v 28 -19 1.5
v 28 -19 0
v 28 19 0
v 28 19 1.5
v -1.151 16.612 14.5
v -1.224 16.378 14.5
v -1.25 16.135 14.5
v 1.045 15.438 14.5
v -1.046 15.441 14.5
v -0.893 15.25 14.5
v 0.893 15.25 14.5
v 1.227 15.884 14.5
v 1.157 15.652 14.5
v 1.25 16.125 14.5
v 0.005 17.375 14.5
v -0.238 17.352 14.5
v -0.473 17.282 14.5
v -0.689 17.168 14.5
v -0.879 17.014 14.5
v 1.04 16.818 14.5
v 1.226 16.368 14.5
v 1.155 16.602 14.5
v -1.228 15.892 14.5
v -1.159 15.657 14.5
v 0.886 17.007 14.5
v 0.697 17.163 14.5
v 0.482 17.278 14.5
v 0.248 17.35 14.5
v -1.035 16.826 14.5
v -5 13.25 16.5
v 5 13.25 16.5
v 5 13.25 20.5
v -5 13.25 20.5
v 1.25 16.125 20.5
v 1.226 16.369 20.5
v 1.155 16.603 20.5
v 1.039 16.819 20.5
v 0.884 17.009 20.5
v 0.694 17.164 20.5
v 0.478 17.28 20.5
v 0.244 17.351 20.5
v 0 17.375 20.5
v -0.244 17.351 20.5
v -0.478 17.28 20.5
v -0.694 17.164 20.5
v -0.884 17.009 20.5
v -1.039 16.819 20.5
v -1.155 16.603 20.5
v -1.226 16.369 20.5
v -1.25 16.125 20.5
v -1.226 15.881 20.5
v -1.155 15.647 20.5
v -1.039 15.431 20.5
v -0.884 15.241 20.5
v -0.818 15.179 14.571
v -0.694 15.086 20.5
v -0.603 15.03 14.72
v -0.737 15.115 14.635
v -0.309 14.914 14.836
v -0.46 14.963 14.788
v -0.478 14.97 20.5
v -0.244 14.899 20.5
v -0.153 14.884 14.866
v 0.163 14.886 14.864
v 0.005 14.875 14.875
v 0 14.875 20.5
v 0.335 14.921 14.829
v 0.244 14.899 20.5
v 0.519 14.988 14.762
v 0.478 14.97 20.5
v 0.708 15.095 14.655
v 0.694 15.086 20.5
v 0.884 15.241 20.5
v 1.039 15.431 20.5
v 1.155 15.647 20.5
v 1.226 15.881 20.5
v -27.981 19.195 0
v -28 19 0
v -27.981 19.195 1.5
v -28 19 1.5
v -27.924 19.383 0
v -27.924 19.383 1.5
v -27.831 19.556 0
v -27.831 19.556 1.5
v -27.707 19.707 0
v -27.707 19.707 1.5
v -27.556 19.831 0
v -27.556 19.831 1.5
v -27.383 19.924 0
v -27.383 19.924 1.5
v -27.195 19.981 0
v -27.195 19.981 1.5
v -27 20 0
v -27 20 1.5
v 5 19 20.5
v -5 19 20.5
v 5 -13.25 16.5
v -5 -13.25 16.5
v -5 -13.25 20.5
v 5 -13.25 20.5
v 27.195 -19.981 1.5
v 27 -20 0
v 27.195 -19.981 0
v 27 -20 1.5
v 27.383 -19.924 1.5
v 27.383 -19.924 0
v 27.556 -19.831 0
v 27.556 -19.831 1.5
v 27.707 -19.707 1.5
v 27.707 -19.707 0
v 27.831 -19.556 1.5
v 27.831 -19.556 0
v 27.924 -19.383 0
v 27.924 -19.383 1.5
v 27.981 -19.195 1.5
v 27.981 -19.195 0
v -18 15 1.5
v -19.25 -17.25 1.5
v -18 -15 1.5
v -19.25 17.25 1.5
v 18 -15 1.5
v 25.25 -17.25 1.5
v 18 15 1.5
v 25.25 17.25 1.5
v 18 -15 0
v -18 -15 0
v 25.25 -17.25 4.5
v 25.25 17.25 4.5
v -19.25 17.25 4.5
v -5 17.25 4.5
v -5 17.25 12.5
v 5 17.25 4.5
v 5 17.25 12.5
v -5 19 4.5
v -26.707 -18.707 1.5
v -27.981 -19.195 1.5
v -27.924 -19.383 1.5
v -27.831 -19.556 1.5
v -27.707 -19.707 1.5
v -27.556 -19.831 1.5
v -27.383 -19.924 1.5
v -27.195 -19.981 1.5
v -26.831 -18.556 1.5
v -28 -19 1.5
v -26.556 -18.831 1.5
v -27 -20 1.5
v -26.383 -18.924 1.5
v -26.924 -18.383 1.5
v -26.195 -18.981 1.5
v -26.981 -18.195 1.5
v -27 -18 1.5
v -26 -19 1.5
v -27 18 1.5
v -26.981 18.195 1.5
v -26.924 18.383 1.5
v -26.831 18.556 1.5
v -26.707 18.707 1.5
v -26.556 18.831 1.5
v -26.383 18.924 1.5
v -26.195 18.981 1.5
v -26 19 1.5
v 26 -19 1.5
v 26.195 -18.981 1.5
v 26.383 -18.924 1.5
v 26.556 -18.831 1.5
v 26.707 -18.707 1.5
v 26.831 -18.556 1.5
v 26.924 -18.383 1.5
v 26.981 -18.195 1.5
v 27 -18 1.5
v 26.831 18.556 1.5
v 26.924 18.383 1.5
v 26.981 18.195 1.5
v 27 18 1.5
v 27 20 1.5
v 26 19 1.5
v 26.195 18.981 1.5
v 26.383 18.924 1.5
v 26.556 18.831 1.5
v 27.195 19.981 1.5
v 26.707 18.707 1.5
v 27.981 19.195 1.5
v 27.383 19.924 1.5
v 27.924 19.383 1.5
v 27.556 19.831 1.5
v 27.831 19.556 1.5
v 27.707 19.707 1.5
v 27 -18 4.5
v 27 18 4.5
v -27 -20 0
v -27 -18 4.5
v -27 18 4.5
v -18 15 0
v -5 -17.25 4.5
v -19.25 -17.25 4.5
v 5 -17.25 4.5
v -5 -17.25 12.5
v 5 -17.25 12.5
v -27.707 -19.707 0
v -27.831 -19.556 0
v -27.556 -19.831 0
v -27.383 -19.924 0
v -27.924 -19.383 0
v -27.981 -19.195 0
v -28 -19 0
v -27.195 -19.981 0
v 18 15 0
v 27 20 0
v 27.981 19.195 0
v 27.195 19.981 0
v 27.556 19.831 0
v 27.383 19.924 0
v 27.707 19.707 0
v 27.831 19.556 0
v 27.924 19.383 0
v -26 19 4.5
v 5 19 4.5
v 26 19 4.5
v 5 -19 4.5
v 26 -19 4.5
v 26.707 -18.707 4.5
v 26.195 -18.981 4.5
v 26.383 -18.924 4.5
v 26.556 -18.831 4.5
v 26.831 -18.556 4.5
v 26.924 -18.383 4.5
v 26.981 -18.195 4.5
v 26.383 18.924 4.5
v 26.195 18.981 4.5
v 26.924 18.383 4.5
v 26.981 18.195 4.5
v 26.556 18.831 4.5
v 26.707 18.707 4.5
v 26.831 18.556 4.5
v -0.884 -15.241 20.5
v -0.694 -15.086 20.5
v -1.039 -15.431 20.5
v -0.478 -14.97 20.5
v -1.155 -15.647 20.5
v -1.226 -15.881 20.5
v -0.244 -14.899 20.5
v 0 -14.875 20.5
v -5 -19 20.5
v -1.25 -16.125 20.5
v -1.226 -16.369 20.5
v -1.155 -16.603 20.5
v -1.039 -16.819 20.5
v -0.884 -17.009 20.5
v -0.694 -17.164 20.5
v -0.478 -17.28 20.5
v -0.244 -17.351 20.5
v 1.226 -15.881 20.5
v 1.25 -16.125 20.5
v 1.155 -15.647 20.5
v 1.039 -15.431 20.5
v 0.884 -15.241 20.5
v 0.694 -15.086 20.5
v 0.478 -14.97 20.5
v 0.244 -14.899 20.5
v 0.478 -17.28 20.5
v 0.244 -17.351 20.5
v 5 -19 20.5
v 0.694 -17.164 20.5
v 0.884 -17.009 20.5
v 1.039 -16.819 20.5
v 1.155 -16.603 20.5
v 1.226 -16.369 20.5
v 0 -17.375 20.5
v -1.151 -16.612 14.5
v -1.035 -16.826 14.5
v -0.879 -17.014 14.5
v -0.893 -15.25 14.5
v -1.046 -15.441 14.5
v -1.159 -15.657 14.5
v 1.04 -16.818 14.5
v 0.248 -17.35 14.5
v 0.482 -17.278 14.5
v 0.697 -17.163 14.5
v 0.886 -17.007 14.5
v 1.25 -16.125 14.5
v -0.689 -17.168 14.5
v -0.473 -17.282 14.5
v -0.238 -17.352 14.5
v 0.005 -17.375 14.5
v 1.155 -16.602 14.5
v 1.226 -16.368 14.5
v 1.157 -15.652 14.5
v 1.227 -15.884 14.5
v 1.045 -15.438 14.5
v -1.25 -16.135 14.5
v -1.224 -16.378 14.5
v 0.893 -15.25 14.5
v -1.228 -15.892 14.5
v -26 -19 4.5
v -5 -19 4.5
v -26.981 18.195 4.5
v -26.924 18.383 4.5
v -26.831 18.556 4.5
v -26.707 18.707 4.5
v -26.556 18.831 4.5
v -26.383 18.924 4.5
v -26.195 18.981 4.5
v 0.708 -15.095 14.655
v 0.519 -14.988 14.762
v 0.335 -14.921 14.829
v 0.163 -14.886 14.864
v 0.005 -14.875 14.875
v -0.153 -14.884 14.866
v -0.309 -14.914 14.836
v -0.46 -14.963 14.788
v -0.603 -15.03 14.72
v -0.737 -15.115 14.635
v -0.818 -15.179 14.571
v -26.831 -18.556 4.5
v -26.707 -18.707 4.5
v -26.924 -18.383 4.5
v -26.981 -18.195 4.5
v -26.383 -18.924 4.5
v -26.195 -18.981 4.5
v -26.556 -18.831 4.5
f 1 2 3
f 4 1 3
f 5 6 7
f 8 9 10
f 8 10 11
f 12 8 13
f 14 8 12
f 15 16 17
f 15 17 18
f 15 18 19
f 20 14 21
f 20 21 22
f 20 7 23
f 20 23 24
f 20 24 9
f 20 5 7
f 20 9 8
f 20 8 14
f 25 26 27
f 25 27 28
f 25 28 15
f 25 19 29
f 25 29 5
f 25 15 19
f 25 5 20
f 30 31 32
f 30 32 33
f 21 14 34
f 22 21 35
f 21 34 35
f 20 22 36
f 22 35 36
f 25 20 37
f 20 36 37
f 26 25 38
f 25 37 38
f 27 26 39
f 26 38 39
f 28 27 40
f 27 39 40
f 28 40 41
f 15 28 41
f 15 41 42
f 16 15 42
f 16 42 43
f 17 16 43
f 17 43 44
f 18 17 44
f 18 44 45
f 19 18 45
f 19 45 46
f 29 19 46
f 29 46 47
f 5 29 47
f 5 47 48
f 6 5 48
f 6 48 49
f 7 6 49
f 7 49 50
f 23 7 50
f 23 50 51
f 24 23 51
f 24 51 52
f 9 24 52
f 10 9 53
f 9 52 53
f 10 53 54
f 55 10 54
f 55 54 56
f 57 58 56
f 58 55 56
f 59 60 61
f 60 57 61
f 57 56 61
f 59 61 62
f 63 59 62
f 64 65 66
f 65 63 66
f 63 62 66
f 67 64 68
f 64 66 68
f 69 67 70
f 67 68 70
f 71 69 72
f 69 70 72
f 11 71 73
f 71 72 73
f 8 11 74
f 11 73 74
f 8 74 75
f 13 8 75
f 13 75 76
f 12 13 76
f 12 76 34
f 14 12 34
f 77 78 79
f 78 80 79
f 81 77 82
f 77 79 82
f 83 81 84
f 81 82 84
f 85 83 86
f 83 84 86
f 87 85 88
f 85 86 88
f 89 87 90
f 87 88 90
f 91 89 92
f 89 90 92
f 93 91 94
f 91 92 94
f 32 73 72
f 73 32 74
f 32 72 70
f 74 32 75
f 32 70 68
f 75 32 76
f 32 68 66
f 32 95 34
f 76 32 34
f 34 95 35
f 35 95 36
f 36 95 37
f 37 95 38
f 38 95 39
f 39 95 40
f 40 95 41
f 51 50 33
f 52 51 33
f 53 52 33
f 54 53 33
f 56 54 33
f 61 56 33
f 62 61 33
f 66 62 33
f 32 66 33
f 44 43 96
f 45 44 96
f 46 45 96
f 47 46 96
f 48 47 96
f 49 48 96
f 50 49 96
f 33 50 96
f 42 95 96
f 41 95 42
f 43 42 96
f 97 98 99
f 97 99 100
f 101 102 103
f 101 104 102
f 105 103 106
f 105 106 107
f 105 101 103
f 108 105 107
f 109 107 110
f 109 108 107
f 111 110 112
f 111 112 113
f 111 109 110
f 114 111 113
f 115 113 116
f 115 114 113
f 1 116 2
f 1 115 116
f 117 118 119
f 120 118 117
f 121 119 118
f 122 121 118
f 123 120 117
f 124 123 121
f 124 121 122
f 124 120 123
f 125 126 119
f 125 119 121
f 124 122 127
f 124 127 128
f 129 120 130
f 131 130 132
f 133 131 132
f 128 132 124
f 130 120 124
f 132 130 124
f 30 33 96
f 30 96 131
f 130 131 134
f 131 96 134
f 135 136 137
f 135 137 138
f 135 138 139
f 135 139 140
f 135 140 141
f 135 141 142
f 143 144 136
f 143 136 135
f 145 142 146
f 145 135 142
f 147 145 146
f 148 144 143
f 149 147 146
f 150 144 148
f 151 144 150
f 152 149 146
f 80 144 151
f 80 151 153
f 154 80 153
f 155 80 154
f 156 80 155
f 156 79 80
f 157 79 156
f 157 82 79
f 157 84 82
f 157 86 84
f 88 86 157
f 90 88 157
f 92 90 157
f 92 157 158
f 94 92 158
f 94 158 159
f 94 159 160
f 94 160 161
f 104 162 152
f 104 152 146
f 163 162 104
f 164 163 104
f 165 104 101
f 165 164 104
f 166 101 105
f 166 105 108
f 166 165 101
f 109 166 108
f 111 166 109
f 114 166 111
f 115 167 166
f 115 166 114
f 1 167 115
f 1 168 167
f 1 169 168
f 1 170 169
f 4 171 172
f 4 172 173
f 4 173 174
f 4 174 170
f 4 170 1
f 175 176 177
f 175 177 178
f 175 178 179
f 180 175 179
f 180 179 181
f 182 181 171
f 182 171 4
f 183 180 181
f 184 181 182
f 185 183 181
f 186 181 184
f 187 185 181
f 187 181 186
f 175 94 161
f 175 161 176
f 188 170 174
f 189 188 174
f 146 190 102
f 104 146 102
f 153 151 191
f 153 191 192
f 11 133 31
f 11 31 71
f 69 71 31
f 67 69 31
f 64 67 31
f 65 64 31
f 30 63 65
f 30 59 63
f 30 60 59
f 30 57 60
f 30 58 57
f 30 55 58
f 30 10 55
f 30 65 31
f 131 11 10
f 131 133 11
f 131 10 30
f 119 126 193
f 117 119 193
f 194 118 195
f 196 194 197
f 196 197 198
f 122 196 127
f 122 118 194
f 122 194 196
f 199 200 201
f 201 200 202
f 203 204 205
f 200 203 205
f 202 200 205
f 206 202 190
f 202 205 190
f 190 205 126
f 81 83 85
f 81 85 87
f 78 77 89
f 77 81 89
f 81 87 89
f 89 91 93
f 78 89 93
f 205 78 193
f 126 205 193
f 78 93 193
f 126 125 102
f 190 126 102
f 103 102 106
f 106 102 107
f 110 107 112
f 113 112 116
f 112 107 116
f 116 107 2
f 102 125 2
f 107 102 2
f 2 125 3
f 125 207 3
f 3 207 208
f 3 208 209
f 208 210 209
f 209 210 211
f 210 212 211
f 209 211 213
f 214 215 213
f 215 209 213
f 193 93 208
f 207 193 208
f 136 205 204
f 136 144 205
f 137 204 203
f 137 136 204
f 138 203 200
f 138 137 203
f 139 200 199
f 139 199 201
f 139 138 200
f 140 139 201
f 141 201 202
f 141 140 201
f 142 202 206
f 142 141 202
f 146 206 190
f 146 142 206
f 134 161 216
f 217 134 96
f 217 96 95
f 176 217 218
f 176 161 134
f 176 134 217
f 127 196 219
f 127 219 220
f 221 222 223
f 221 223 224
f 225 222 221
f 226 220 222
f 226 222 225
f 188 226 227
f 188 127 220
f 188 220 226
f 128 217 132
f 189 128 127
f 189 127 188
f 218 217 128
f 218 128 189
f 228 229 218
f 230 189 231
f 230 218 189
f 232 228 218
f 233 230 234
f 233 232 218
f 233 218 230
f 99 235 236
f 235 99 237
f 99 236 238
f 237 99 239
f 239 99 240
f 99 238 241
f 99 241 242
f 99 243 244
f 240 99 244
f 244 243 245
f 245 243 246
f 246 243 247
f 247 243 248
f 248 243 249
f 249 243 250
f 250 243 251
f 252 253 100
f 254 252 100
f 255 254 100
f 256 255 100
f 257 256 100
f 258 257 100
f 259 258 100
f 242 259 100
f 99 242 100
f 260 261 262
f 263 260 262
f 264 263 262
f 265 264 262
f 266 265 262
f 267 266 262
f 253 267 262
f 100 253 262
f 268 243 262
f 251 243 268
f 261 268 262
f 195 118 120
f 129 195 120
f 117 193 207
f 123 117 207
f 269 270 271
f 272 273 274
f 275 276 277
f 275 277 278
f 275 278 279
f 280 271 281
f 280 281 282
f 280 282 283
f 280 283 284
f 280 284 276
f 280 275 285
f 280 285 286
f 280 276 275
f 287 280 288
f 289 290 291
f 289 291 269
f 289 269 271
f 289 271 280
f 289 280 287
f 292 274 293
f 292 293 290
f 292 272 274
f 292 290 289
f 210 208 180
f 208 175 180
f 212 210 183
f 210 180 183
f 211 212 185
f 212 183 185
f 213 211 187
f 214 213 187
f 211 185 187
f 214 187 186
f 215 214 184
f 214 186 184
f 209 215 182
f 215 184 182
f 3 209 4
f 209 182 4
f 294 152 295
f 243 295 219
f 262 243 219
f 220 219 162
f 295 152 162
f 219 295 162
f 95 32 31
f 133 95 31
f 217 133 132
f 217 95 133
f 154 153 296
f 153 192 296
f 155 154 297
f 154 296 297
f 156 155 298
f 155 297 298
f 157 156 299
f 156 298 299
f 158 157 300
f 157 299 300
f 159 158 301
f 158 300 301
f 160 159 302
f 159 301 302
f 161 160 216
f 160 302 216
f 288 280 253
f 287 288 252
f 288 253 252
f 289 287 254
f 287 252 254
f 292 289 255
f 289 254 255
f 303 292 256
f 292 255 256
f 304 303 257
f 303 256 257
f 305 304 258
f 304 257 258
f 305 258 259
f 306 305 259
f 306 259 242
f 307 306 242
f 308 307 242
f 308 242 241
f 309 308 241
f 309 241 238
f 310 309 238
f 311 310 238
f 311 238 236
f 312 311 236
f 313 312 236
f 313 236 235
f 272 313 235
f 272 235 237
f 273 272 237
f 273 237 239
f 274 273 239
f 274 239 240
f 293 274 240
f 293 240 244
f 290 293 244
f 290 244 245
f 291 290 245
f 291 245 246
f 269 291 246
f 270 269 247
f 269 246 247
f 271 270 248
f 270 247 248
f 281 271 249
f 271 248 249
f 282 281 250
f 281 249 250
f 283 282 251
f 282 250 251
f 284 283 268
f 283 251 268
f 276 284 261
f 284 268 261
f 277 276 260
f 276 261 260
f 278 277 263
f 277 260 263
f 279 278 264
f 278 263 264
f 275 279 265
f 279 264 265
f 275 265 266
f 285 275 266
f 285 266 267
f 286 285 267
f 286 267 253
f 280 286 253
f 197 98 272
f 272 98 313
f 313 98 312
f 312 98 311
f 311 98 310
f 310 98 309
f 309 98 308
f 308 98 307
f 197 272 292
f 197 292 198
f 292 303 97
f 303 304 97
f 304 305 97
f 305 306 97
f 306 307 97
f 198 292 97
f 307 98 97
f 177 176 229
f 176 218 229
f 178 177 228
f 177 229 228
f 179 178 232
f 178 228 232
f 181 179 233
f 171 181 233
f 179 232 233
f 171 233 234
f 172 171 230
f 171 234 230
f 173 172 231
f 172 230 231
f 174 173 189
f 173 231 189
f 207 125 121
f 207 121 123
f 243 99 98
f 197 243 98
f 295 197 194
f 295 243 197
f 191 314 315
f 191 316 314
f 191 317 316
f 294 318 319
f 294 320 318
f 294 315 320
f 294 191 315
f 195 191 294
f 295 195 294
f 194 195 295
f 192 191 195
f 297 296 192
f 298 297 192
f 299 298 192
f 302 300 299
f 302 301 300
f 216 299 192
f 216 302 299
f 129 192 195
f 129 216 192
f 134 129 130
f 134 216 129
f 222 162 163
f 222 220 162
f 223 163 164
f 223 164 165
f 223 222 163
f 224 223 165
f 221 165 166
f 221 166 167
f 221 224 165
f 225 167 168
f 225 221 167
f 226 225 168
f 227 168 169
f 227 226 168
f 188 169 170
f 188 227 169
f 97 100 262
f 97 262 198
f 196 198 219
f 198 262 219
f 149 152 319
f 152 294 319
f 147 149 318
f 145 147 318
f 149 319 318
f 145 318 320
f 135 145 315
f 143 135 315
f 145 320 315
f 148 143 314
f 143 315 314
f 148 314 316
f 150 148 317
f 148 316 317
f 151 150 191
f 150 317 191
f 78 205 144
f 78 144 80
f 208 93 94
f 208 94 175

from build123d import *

# Parameters (mm, degrees)
SKETCH1_W           = 56
SKETCH1_H           = 40
SKETCH1_W_2         = 36
SKETCH1_H_2         = 30
BOSS_EXTRUDE1_DEPTH = 1.5
SKETCH2_W           = 54
SKETCH2_H           = 38
SKETCH2_W_2         = 44.5
SKETCH2_H_2         = 34.5
BOSS_EXTRUDE2_DEPTH = 3
SKETCH3_W           = 10
SKETCH3_H           = 1.75
BOSS_EXTRUDE3_DEPTH = 16
SKETCH4_W           = 10
SKETCH4_H           = 4
BOSS_EXTRUDE4_DEPTH = 4
SKETCH6_W           = 10
SKETCH6_H           = 4
BOSS_EXTRUDE5_DEPTH = 4
CHAMFER1_SIZE       = 4
SKETCH7_R           = 1.25
CUT_EXTRUDE2_DEPTH  = 6
FILLET1_R           = 1


with BuildPart() as part:
    # Sketch1 → Boss-Extrude1 (new body)
    with BuildSketch(Plane.XY):
        Rectangle(SKETCH1_W, SKETCH1_H)
        Rectangle(SKETCH1_W_2, SKETCH1_H_2, mode=Mode.SUBTRACT)
    extrude(amount=BOSS_EXTRUDE1_DEPTH)

    # Sketch2 → Boss-Extrude2 (add)
    with BuildSketch(Plane.XY.offset(1.5)):
        Rectangle(SKETCH2_W, SKETCH2_H)
        with Locations((3, 0)):
            Rectangle(SKETCH2_W_2, SKETCH2_H_2, mode=Mode.SUBTRACT)
    extrude(amount=BOSS_EXTRUDE2_DEPTH)

    # Sketch3 → Boss-Extrude3 (add)
    with BuildSketch(Plane.XY.offset(4.5)):
        with Locations((0, 18.125)):
            Rectangle(SKETCH3_W, SKETCH3_H)
        with Locations((0, -18.125)):
            Rectangle(SKETCH3_W, SKETCH3_H)
    extrude(amount=BOSS_EXTRUDE3_DEPTH)

    # Sketch4 → Boss-Extrude4 (add)
    with BuildSketch(Plane(origin=(0, 17.25, 0), x_dir=(-1, 0, 0), z_dir=(0, -1, 0))):
        with Locations((0, -18.5)):
            Rectangle(SKETCH4_W, SKETCH4_H)
    extrude(amount=BOSS_EXTRUDE4_DEPTH)

    # Sketch6 → Boss-Extrude5 (add)
    with BuildSketch(Plane(origin=(0, -17.25, 0), x_dir=(1, 0, 0), z_dir=(0, 1, 0))):
        with Locations((0, -18.5)):
            Rectangle(SKETCH6_W, SKETCH6_H)
    extrude(amount=BOSS_EXTRUDE5_DEPTH)

    # Chamfer1
    chamfer1_edges = [part.edges().sort_by_distance(p)[0] for p in [
        (0, -17.25, 16.5),
        (0, 17.25, 16.5),
    ]]
    chamfer(chamfer1_edges, length=CHAMFER1_SIZE - 0.0001)  # a hair under: the kernel refuses the full size

    # Sketch7 → Cut-Extrude2 (cut)
    with BuildSketch(Plane.XY.offset(20.5)):
        with Locations((0, 16.125)):
            Circle(SKETCH7_R)
        with Locations((0, -16.125)):
            Circle(SKETCH7_R)
    extrude(amount=-CUT_EXTRUDE2_DEPTH, mode=Mode.SUBTRACT)

    # Fillet1
    fillet1_edges = [part.edges().sort_by_distance(p)[0] for p in [
        (-27, 19, 3),
        (-27, -19, 3),
        (27, -19, 3),
        (27, 19, 3),
        (-28, 20, 0.75),
        (28, 20, 0.75),
        (28, -20, 0.75),
        (-28, -20, 0.75),
    ]]
    fillet(fillet1_edges, radius=FILLET1_R)


solid = part.part
